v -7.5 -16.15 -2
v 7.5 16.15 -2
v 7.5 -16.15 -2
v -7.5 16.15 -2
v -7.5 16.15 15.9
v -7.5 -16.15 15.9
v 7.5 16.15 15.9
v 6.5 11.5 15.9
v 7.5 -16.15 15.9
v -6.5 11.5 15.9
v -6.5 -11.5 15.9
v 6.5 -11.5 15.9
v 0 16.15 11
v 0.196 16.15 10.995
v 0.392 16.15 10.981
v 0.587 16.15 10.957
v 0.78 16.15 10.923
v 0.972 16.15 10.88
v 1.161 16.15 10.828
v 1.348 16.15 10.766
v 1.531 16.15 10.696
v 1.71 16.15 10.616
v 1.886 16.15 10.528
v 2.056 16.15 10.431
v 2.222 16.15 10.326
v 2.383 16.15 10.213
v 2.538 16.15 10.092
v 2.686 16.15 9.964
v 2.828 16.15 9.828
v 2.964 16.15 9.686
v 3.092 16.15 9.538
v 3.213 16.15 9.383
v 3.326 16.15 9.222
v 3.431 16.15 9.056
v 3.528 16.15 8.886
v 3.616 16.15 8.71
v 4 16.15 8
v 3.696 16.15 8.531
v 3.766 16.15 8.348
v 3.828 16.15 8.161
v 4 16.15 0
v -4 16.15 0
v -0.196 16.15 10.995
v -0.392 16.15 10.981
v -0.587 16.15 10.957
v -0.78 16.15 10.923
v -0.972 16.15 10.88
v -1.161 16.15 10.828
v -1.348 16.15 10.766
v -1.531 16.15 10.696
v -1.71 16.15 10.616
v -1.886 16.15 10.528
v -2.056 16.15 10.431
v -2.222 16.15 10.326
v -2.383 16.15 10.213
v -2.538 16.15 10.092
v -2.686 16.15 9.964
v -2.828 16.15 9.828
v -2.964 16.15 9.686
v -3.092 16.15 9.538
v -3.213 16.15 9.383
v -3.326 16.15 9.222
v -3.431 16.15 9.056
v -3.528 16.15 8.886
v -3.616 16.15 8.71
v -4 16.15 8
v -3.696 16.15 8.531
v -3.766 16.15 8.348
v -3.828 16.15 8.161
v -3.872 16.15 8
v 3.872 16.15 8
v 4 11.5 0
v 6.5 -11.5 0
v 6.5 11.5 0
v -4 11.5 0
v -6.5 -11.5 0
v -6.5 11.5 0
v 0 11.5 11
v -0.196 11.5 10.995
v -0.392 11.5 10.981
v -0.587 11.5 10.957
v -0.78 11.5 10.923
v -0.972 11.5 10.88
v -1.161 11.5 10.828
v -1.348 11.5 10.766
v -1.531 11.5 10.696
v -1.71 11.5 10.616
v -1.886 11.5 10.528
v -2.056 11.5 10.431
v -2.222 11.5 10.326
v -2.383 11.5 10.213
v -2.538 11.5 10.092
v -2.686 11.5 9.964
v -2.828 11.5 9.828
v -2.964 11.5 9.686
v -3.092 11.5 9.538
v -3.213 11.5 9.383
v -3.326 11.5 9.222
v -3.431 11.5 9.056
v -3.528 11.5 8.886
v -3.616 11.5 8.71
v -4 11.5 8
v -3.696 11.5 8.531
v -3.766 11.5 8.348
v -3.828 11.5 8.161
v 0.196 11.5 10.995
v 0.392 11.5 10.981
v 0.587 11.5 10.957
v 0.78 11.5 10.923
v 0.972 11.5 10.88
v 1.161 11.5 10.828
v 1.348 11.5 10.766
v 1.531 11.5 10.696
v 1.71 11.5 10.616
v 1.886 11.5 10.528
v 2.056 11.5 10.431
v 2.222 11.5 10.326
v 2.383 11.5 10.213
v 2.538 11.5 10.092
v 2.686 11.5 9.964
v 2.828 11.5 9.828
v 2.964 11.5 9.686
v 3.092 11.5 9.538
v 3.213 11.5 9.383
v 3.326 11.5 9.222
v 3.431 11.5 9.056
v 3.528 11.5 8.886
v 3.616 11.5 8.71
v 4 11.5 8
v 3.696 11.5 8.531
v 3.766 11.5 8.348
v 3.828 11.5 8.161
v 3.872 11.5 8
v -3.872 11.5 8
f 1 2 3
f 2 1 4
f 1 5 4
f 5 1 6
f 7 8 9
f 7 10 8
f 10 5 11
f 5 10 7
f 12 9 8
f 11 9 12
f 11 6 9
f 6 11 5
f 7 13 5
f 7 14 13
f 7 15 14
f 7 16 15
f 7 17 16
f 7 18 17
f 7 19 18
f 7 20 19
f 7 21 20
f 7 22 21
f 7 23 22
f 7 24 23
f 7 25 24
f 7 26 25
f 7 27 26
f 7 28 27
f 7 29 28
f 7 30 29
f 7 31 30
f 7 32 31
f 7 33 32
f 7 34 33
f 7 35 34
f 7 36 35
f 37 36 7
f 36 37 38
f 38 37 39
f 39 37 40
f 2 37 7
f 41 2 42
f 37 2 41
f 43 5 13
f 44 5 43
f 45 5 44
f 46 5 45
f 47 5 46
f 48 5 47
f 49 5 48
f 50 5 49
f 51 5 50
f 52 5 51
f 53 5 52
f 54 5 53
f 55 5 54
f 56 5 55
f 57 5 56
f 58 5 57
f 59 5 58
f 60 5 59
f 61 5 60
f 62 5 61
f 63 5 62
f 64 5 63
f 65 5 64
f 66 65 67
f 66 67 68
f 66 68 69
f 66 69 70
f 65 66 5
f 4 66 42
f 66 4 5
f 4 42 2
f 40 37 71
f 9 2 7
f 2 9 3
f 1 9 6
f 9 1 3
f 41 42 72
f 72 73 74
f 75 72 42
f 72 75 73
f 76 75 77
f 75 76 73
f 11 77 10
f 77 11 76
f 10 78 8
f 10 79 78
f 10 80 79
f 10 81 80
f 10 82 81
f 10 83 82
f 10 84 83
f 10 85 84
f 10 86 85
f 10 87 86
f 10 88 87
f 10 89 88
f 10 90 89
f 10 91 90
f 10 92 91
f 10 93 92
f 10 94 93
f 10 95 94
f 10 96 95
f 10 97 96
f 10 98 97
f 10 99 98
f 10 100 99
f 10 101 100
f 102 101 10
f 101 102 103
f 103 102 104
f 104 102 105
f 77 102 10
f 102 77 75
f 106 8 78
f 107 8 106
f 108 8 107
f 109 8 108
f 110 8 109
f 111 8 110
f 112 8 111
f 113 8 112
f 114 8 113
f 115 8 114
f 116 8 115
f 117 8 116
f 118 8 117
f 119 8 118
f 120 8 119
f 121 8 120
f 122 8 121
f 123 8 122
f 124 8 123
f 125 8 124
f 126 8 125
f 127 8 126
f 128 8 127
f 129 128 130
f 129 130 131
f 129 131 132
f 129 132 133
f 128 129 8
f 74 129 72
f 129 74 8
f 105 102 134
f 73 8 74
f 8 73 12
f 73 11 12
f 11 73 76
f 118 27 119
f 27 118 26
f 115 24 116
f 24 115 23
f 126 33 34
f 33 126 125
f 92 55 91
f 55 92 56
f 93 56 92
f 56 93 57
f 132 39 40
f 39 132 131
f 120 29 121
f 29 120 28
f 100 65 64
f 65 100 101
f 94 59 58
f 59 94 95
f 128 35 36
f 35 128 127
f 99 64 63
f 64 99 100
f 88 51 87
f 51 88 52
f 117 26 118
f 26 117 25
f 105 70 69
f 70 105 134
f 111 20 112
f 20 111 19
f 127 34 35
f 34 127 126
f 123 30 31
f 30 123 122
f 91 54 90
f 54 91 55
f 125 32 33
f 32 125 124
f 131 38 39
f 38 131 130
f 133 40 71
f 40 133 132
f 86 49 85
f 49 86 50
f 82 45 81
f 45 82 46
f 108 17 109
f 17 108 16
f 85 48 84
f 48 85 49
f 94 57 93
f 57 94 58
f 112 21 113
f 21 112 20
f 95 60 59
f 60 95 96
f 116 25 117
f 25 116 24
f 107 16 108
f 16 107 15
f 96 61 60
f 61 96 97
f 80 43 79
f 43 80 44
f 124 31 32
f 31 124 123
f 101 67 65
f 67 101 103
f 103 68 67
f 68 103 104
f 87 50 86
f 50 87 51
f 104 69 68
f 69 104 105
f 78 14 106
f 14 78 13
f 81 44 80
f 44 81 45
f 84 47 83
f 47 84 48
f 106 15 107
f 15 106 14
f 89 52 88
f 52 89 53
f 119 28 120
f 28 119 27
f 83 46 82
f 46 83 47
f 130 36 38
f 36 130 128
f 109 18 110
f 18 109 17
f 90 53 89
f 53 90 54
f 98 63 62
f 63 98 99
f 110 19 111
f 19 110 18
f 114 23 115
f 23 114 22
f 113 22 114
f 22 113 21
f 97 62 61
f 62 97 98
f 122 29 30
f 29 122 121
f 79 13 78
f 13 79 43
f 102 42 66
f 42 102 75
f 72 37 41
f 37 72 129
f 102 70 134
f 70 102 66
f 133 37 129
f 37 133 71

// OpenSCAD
width=13;
length=23;
groove_length=32.3;
groove_hieght=2.6;
inset_hieght=18.5-groove_hieght;

wire_diameter=6;
wire_height=6;

$fn=128;
/*
color("#3333ff")
linear_extrude(inset_hieght)
square([width, length], true);

color("#3333ff")
translate([0,0,inset_hieght])   
linear_extrude(groove_hieght)
square([width, groove_length], true);

color("#ff3333")
translate([0,0,wire_height])
rotate([-90,0,0])
linear_extrude(20)
circle(d=wire_diameter);
*/

offset=2;
translate([0,0,-offset])
difference() {
    linear_extrude(inset_hieght+offset)
    square([width+offset, groove_length], true);

    translate([0,0,offset])
    linear_extrude(inset_hieght+1)
    square([width, length], true);
    
    translate([0,0,7+offset])
    rotate([-90,0,0])
    linear_extrude(20)
    circle(d=wire_diameter+offset);
    
    translate([0,0,6])
    rotate([-90,0,0])
    linear_extrude(20)
    square(6+offset, true);
}
